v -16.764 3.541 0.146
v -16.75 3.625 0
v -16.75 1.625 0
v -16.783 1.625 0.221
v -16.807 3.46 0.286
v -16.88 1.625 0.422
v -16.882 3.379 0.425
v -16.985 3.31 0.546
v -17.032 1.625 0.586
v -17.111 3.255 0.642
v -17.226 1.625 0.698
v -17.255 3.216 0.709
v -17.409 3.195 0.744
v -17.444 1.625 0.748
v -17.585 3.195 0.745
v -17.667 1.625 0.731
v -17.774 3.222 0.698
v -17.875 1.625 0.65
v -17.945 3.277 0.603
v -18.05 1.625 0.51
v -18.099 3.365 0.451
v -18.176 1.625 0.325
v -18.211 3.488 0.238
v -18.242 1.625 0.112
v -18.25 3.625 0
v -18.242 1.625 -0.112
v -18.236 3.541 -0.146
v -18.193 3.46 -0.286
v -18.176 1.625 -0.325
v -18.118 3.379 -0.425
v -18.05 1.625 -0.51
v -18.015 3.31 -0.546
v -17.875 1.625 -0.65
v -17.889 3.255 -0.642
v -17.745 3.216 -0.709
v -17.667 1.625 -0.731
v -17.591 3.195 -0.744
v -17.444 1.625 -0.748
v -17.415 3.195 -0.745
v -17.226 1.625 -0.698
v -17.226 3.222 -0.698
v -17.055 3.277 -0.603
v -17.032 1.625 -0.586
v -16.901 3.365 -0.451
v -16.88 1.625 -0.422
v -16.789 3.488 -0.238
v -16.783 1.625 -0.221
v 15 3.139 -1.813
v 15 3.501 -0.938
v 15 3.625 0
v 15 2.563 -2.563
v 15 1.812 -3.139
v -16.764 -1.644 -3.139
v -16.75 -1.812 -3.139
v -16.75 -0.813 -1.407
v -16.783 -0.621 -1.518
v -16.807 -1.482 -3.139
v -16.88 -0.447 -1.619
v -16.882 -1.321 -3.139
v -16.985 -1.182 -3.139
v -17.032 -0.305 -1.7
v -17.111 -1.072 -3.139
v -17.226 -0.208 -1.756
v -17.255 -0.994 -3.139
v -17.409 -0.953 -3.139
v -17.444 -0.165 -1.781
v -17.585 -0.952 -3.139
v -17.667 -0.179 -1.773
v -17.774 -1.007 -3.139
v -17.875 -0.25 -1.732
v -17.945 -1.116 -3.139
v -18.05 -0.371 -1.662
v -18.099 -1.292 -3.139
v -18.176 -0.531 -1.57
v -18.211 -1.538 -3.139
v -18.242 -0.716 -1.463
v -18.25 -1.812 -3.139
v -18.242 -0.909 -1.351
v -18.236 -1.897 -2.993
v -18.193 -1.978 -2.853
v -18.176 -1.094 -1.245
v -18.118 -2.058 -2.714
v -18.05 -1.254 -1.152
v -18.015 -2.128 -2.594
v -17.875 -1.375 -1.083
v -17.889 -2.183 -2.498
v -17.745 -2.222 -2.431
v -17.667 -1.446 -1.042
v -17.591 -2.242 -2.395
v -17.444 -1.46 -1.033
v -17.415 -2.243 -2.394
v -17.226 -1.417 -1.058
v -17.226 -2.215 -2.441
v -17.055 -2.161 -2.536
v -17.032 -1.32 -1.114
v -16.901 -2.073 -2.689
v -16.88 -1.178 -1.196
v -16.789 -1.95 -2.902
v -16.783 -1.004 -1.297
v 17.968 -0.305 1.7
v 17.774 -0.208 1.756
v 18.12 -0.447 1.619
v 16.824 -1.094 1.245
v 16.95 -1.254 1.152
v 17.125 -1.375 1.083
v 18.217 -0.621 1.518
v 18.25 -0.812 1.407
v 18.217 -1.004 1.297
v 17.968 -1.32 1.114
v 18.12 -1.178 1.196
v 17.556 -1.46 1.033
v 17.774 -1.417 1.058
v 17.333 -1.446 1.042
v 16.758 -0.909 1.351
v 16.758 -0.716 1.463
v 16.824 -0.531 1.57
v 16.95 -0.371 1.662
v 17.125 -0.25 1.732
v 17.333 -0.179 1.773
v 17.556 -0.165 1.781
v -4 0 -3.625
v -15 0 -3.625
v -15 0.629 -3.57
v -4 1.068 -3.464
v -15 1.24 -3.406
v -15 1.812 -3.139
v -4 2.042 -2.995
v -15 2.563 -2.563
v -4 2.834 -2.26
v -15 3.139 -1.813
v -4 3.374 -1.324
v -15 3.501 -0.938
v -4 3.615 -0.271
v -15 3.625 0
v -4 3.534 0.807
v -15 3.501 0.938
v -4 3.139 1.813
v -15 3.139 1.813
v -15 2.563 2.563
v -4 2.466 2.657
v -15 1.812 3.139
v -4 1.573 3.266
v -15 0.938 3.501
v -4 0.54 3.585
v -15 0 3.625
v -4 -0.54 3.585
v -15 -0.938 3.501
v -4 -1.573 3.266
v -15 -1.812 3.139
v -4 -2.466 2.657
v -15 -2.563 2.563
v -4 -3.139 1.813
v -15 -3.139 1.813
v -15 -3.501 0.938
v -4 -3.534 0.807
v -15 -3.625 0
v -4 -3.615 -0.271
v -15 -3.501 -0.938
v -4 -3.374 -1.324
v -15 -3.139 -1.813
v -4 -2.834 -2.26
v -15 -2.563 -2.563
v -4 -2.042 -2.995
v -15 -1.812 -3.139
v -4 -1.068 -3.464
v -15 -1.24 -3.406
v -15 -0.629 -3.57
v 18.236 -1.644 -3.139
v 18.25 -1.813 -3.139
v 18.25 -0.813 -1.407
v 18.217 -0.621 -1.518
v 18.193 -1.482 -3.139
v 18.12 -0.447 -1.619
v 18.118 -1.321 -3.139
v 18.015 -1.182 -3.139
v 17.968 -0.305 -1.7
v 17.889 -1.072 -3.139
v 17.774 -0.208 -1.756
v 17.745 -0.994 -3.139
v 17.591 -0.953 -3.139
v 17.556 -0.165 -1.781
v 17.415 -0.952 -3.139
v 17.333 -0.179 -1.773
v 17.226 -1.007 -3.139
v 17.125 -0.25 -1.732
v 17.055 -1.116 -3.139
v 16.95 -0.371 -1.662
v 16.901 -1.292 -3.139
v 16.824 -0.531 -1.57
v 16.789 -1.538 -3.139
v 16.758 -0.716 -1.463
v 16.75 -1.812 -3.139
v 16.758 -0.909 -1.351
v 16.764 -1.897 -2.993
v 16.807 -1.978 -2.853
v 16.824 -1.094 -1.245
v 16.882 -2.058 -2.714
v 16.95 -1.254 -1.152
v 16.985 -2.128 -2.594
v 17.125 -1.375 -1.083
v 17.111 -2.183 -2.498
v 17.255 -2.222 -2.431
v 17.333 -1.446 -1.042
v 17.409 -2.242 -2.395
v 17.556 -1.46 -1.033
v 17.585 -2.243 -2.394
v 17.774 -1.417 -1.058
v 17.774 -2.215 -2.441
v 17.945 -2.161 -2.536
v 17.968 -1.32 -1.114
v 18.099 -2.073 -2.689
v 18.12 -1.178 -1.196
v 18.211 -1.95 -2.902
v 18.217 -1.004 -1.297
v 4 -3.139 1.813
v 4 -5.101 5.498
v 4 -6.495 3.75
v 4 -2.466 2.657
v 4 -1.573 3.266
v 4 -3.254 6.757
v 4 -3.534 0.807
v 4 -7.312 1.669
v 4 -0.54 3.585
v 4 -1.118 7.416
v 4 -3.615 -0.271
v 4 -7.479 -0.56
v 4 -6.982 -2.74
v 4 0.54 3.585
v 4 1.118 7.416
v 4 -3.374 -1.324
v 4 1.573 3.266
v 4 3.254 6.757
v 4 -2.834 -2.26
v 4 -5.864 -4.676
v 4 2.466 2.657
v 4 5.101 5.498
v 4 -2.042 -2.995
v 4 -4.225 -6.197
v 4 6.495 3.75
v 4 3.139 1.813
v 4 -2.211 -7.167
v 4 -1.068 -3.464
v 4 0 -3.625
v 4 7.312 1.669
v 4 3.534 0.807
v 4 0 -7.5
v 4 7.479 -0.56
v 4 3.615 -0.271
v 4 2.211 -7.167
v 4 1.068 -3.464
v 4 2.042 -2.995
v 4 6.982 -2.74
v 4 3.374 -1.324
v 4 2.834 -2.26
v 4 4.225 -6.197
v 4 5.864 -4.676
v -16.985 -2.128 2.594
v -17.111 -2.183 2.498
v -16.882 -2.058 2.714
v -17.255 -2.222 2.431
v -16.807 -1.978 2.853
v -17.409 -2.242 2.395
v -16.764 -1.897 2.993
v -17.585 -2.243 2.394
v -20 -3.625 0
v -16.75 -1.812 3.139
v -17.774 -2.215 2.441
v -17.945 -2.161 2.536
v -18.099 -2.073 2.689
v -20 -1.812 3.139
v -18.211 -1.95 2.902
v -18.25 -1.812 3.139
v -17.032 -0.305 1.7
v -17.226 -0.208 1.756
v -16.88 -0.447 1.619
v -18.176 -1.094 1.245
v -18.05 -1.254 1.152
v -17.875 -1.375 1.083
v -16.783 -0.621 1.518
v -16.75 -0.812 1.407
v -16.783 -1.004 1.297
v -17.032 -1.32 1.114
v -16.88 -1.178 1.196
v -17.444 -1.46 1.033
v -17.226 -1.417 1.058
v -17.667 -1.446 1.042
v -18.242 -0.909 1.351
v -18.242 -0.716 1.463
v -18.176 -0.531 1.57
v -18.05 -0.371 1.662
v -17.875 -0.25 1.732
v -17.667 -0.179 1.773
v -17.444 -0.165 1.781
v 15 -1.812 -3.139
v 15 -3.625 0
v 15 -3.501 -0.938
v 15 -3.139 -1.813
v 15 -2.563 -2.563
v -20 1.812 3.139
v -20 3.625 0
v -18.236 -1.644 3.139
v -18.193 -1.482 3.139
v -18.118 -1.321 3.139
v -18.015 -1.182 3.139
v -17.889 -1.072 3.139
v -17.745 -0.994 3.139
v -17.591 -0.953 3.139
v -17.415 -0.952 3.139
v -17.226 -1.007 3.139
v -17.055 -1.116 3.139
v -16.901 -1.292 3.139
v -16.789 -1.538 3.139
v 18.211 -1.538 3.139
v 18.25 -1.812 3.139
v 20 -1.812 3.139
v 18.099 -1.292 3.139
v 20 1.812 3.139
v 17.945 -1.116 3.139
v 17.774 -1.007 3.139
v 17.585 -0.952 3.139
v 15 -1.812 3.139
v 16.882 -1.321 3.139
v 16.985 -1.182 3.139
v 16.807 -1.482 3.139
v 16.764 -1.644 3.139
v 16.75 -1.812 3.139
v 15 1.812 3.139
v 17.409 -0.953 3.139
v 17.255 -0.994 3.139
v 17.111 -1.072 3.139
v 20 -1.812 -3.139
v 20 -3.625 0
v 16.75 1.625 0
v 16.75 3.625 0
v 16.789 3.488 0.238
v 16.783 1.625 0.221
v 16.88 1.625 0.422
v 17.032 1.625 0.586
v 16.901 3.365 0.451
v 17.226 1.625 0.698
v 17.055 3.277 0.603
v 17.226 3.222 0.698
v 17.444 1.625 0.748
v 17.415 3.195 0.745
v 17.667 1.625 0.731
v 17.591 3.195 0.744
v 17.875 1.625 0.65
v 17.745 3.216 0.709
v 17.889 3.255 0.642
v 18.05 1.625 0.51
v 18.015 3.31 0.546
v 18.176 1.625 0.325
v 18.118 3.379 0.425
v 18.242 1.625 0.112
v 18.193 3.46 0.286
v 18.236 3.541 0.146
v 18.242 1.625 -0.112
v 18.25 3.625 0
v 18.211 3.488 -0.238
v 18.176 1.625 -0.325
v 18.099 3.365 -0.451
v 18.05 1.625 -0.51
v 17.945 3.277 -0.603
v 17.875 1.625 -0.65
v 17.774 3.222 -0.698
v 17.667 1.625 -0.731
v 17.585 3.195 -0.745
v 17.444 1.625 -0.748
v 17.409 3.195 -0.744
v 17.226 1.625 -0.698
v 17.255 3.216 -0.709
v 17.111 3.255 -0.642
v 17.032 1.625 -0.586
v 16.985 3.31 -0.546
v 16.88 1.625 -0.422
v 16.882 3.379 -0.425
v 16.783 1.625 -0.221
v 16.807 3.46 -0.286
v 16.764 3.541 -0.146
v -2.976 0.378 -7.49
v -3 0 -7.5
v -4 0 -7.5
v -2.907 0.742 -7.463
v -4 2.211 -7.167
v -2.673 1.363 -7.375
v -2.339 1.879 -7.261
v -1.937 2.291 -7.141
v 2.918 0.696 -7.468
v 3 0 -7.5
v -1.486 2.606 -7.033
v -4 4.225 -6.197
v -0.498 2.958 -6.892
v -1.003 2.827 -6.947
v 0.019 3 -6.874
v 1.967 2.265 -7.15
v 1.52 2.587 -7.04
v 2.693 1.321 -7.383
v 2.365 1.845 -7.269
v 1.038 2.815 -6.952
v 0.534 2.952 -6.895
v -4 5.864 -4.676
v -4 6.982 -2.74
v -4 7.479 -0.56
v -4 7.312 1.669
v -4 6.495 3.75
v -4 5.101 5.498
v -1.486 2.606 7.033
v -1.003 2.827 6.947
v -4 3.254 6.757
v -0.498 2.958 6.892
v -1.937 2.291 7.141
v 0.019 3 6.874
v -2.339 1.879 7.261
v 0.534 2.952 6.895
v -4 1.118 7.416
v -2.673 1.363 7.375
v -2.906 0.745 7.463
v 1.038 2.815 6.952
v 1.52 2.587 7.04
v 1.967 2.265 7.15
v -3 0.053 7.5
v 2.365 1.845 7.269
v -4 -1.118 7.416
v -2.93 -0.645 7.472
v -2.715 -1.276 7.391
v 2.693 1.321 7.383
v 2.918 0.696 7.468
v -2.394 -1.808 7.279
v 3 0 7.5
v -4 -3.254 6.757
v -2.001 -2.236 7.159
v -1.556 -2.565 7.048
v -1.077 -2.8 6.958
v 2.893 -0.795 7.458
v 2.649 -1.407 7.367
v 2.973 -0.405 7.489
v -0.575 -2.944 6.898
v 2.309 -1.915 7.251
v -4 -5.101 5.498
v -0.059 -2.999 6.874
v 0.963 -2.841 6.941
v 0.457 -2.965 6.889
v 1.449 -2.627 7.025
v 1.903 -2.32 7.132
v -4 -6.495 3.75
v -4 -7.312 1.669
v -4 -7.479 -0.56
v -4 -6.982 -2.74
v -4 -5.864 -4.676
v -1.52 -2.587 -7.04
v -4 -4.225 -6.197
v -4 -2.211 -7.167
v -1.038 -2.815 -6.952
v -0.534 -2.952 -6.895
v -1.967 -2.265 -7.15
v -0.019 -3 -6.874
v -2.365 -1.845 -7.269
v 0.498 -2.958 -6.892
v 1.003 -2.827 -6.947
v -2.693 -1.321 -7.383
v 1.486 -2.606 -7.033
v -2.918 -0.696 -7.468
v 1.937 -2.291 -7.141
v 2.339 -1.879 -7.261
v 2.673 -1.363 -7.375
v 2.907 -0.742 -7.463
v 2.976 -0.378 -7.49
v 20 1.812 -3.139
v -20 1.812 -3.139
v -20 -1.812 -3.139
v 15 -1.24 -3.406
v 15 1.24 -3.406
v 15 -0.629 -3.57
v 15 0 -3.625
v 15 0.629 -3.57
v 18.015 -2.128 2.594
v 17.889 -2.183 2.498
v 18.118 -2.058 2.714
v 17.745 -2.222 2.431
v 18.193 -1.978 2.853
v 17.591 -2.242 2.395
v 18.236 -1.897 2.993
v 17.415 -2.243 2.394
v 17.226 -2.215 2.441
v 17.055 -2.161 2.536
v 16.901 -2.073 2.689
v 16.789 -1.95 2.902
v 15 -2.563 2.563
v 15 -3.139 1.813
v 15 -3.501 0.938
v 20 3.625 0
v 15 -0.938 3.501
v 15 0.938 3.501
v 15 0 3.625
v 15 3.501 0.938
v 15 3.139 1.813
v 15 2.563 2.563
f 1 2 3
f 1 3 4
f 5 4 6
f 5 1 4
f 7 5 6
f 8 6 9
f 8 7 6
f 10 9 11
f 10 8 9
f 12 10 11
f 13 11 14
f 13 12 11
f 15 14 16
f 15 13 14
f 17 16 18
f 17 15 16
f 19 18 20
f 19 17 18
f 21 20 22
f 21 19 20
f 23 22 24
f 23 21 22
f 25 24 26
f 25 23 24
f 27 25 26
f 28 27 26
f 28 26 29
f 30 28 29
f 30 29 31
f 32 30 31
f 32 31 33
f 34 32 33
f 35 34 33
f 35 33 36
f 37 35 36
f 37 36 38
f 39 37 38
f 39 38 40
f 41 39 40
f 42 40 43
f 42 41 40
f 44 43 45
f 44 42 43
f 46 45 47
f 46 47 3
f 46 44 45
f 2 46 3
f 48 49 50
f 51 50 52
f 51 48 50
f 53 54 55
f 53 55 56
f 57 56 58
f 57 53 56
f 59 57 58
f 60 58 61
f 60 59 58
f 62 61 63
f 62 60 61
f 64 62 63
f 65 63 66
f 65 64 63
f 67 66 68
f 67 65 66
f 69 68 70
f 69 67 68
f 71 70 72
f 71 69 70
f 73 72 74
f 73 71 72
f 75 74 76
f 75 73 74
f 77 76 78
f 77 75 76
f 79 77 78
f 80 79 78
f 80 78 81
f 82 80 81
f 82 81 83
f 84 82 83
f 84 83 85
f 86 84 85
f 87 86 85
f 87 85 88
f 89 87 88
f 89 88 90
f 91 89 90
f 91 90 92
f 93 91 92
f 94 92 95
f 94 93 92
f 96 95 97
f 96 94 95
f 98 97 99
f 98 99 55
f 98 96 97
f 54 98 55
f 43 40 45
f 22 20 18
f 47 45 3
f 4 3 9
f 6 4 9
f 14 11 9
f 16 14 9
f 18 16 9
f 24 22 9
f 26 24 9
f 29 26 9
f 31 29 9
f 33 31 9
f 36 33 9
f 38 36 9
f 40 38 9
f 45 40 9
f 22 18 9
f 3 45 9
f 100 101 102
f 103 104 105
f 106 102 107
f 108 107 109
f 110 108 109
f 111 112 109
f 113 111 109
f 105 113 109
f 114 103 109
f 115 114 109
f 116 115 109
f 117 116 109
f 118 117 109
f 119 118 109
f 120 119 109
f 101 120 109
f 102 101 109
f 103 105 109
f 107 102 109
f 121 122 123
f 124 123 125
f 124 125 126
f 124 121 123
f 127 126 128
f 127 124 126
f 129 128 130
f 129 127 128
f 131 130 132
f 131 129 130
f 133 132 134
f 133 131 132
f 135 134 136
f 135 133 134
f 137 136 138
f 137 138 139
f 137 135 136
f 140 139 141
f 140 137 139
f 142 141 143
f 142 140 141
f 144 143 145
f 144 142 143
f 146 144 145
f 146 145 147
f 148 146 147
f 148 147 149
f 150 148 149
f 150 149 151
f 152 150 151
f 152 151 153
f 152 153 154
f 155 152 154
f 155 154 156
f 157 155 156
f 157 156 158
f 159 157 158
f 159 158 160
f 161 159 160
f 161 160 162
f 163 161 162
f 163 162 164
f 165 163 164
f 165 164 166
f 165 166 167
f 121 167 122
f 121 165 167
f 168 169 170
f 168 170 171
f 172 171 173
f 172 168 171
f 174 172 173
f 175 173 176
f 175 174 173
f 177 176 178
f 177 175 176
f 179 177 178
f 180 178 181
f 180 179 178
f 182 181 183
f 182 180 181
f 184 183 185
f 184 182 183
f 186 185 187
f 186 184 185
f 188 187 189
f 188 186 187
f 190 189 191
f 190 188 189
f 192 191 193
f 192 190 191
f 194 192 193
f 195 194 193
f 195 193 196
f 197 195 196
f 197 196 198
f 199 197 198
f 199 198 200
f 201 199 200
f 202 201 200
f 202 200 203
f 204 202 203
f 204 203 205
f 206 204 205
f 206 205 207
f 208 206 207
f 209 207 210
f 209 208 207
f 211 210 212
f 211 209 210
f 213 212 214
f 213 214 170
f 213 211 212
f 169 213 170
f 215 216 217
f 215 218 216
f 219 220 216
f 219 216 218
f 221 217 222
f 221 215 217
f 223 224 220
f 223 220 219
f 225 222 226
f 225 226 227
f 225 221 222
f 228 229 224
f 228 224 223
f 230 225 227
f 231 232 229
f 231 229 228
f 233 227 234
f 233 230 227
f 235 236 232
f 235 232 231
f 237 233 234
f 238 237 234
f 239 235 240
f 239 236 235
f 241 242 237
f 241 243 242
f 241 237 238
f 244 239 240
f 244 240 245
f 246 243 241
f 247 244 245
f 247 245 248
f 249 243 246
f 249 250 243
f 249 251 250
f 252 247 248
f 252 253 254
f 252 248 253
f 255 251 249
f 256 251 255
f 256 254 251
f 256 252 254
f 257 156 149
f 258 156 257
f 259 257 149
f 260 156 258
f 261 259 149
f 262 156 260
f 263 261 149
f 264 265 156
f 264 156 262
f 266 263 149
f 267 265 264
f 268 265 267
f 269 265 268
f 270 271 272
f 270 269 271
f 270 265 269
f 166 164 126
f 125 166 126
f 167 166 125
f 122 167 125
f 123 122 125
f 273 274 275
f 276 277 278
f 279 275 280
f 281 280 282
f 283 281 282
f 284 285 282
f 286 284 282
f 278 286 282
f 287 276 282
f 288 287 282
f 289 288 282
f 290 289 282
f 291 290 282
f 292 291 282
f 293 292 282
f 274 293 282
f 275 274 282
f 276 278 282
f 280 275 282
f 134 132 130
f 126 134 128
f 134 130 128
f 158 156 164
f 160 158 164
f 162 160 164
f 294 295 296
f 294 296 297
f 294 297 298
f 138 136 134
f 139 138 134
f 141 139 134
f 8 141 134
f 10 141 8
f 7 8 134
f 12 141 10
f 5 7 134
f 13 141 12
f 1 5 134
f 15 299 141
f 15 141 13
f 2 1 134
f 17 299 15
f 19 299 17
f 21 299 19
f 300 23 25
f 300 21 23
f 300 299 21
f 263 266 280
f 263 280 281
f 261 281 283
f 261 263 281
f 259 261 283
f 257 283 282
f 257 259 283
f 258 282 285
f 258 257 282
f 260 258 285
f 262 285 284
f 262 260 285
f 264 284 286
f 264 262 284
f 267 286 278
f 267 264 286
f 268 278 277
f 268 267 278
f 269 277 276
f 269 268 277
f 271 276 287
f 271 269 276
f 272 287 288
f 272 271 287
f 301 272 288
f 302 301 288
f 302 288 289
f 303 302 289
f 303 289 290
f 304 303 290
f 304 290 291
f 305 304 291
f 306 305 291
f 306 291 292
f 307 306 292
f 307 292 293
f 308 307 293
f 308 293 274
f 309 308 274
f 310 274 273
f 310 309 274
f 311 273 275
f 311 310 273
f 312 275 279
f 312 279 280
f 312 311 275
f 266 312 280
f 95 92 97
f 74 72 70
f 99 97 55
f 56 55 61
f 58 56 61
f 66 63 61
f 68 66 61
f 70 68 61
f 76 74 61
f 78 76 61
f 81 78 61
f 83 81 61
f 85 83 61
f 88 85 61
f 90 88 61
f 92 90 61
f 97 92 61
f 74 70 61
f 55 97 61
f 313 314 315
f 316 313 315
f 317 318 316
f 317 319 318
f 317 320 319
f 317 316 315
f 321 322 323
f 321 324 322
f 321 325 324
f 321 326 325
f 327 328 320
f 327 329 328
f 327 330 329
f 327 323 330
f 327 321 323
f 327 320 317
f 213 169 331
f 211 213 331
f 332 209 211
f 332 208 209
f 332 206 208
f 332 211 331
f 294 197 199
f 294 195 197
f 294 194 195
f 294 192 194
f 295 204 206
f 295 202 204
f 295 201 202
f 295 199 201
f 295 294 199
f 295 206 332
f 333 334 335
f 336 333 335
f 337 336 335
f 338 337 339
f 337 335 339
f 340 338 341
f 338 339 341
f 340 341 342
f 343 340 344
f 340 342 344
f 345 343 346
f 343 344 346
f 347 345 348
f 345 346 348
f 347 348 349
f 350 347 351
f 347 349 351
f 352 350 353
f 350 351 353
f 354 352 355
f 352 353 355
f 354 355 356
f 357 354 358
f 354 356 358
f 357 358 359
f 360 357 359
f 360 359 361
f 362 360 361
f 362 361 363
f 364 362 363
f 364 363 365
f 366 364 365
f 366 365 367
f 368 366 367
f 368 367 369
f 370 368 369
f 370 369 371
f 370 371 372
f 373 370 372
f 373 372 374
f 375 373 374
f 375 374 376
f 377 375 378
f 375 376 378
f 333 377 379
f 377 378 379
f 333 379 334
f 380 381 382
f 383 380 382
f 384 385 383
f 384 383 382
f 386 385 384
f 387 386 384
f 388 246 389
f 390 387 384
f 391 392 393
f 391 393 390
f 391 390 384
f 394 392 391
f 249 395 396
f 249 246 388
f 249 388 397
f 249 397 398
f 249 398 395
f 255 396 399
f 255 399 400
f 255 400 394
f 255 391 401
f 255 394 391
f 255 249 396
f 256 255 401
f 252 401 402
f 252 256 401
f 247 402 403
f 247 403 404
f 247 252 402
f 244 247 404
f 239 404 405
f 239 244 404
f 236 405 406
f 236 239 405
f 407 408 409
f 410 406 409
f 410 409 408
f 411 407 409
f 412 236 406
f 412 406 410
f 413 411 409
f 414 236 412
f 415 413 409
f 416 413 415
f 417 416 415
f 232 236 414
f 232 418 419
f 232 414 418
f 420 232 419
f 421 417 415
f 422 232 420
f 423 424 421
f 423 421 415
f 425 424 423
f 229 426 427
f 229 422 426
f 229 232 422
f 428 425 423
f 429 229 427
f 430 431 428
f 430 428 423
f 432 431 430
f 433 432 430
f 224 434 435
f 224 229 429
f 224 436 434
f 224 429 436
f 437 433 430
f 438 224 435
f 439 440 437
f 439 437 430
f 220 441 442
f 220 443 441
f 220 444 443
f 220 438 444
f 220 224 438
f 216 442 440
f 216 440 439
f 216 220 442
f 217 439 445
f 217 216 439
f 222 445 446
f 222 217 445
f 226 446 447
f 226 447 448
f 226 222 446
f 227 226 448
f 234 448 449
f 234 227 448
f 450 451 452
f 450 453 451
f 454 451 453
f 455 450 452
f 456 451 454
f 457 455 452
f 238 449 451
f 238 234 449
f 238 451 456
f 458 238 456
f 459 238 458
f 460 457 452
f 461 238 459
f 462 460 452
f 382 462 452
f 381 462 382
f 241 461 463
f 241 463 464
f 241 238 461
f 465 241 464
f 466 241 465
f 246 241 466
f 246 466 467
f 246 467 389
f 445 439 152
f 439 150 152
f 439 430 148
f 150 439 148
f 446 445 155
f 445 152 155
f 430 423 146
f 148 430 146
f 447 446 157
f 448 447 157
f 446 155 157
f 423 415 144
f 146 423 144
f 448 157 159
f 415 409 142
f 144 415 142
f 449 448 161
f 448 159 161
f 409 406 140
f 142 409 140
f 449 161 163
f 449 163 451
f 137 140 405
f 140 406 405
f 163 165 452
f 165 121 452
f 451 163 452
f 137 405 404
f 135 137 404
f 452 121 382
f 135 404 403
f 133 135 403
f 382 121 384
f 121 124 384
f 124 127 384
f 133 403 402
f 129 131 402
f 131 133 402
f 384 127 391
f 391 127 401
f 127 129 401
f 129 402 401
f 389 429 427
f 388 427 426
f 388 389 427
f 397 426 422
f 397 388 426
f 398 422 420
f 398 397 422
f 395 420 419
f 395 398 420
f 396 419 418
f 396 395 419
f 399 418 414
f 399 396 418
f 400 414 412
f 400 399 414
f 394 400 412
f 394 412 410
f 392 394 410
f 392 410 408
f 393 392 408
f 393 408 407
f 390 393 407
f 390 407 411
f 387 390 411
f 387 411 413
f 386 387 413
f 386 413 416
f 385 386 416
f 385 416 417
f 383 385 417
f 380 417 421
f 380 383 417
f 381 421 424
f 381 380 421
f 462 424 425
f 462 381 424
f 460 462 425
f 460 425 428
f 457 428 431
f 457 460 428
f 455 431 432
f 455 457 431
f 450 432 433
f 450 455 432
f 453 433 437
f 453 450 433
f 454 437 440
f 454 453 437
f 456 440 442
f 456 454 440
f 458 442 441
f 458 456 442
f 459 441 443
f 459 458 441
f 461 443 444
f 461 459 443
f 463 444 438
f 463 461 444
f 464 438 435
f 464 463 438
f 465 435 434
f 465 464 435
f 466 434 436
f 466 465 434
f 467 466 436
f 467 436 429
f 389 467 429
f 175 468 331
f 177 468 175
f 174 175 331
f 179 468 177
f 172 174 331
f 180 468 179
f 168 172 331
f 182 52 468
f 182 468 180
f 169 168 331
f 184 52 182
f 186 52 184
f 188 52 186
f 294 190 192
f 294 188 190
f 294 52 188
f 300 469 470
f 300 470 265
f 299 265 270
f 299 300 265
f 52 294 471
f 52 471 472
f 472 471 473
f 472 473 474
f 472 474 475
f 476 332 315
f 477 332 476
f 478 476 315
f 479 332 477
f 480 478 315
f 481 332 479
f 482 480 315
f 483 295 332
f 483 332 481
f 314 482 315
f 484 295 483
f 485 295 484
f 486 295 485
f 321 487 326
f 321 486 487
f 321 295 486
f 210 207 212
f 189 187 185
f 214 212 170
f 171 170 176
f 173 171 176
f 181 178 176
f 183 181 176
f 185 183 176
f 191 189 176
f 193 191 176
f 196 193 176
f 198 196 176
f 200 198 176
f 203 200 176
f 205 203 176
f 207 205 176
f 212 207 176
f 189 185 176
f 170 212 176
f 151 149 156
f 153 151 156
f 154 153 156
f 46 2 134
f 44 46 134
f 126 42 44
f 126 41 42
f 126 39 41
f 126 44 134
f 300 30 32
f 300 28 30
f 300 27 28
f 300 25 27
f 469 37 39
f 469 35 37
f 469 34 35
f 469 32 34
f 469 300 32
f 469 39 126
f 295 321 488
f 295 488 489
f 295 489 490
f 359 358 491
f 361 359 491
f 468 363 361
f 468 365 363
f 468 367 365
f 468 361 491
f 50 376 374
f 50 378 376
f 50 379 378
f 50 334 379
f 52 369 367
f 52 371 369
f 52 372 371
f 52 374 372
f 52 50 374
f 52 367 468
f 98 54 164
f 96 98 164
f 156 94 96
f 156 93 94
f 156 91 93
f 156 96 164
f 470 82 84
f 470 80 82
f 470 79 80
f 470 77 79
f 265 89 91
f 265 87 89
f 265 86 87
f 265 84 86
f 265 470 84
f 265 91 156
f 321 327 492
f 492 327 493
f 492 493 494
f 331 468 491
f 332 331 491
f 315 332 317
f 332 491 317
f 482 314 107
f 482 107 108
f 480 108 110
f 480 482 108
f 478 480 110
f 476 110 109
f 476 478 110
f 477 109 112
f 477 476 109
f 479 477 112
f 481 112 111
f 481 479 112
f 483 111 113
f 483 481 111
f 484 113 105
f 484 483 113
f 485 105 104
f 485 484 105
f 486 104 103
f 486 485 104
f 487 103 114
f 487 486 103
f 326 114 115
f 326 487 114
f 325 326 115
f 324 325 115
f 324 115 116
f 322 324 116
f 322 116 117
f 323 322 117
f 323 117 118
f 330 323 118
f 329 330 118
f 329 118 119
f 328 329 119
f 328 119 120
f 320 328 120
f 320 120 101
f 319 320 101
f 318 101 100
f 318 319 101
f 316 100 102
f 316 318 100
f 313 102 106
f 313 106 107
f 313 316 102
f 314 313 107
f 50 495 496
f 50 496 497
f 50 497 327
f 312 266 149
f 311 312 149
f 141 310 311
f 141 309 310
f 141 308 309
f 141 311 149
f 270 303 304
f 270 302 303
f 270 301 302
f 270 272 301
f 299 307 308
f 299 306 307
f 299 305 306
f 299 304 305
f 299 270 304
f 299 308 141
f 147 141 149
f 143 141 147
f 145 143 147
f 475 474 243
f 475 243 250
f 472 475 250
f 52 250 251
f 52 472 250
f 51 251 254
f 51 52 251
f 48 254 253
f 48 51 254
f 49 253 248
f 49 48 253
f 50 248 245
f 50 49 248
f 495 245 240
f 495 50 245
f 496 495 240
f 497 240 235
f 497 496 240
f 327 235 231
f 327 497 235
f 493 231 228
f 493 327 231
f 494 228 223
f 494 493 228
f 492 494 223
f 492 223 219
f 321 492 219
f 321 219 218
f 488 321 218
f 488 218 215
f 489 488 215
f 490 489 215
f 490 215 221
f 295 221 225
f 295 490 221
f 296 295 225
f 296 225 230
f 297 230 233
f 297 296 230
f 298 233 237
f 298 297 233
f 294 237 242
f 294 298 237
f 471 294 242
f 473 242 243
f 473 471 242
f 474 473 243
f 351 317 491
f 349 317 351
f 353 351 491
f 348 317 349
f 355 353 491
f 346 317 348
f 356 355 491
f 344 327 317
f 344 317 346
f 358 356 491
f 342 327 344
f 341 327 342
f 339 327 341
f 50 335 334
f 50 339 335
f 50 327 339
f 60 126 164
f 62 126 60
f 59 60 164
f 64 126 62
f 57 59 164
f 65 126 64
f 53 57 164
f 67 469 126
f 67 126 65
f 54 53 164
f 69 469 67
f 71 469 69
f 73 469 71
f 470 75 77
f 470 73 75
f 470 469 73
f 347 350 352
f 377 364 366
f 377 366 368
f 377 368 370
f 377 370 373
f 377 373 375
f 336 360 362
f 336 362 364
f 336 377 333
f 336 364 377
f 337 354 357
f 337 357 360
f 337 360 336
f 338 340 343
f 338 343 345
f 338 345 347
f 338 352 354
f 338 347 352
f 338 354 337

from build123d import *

# Parameters (mm, degrees)
SKETCH2_R               = 7.5
BOSS_EXTRUDE1_DEPTH     = 4
SKETCH4_R               = 3.625
BOSS_EXTRUDE3_DEPTH     = 15
BOSS_EXTRUDE4_DEPTH     = 20
CUT_EXTRUDE1_DEPTH      = 23.638462845
CUT_EXTRUDE1_DEPTH_BACK = 23.638462845
SKETCH1_R               = 3
SKETCH6_R               = 0.75
CUT_EXTRUDE2_DEPTH      = 2
CIRPATTERN1_COUNT       = 3
MIRROR1_COPY_1_SKETCH_R = 0.75
MIRROR1_COPY_1_DEPTH    = 2
MIRROR1_COPY_2_SKETCH_R = 0.75
MIRROR1_COPY_2_DEPTH    = 2


with BuildPart() as part:
    # Sketch2 → Boss-Extrude1 (new, symmetric)
    with BuildSketch(Plane(origin=(0, 0, 0), x_dir=(0, 0, -1), z_dir=(1, 0, 0))):
        Circle(SKETCH2_R)
    extrude(amount=BOSS_EXTRUDE1_DEPTH, both=True)

    # Sketch4 → Boss-Extrude3 (add, symmetric)
    with BuildSketch(Plane(origin=(0, 0, 0), x_dir=(0, 0, -1), z_dir=(1, 0, 0))):
        Circle(SKETCH4_R)
    extrude(amount=BOSS_EXTRUDE3_DEPTH, both=True)

    # Sketch5 → Boss-Extrude4 (add, symmetric)
    with BuildSketch(Plane.ZY):
        Polygon((0, 3.625), (-3.139342089, 1.8125), (-3.139342089, -1.8125), (0, -3.625), (3.139342089, -1.8125), (3.139342089, 1.8125), align=None)
    extrude(amount=BOSS_EXTRUDE4_DEPTH, both=True)

    # Sketch1 → Cut-Extrude1 (cut, two sides: drawn at the far end of the back side and taken through both)
    with BuildSketch(Plane.XY.offset(-CUT_EXTRUDE1_DEPTH_BACK)):
        Circle(SKETCH1_R)
    extrude(amount=CUT_EXTRUDE1_DEPTH + CUT_EXTRUDE1_DEPTH_BACK, mode=Mode.SUBTRACT)

    # Sketch6 → Cut-Extrude2 (cut)
    with BuildSketch(Plane(origin=(0, 3.625, -26.115381057), x_dir=(-1, 0, 0), z_dir=(0, -1, 0))):
        with Locations(Location((17.5, -26.115381057, 0), (0, 0, 180))):
            Circle(SKETCH6_R)
    cut_extrude2 = extrude(amount=CUT_EXTRUDE2_DEPTH, mode=Mode.SUBTRACT)

    # CirPattern1: Cut-Extrude2 ×3 about axis
    cirpattern1_axis = Axis((0, 0, 0), (1, 0, 0))
    for i in range(1, CIRPATTERN1_COUNT):
        add(cut_extrude2.rotate(cirpattern1_axis, i * 360 / CIRPATTERN1_COUNT), mode=Mode.SUBTRACT)

    # Mirror1: Cut-Extrude2 across plane
    add(cut_extrude2.mirror(Plane(origin=(0, 0, 0), x_dir=(0, 0, 1), z_dir=(1, 0, 0))), mode=Mode.SUBTRACT)

    # Mirror1 copy 1 sketch → Mirror1 copy 1 (cut)
    with BuildSketch(Plane(origin=(0, 20.804083425, 16.197032617), x_dir=(1, 0, 0), z_dir=(0, 0.4999999999999998, -0.8660254037844387))):
        with Locations((17.5, 26.115381057)):
            Circle(MIRROR1_COPY_1_SKETCH_R)
    extrude(amount=MIRROR1_COPY_1_DEPTH, mode=Mode.SUBTRACT)

    # Mirror1 copy 2 sketch → Mirror1 copy 2 (cut)
    with BuildSketch(Plane(origin=(0, -24.429083425, 9.91834844), x_dir=(1, 0, 0), z_dir=(0, 0.5000000000000004, 0.8660254037844384))):
        with Locations((17.5, 26.115381057)):
            Circle(MIRROR1_COPY_2_SKETCH_R)
    extrude(amount=MIRROR1_COPY_2_DEPTH, mode=Mode.SUBTRACT)


solid = part.part
